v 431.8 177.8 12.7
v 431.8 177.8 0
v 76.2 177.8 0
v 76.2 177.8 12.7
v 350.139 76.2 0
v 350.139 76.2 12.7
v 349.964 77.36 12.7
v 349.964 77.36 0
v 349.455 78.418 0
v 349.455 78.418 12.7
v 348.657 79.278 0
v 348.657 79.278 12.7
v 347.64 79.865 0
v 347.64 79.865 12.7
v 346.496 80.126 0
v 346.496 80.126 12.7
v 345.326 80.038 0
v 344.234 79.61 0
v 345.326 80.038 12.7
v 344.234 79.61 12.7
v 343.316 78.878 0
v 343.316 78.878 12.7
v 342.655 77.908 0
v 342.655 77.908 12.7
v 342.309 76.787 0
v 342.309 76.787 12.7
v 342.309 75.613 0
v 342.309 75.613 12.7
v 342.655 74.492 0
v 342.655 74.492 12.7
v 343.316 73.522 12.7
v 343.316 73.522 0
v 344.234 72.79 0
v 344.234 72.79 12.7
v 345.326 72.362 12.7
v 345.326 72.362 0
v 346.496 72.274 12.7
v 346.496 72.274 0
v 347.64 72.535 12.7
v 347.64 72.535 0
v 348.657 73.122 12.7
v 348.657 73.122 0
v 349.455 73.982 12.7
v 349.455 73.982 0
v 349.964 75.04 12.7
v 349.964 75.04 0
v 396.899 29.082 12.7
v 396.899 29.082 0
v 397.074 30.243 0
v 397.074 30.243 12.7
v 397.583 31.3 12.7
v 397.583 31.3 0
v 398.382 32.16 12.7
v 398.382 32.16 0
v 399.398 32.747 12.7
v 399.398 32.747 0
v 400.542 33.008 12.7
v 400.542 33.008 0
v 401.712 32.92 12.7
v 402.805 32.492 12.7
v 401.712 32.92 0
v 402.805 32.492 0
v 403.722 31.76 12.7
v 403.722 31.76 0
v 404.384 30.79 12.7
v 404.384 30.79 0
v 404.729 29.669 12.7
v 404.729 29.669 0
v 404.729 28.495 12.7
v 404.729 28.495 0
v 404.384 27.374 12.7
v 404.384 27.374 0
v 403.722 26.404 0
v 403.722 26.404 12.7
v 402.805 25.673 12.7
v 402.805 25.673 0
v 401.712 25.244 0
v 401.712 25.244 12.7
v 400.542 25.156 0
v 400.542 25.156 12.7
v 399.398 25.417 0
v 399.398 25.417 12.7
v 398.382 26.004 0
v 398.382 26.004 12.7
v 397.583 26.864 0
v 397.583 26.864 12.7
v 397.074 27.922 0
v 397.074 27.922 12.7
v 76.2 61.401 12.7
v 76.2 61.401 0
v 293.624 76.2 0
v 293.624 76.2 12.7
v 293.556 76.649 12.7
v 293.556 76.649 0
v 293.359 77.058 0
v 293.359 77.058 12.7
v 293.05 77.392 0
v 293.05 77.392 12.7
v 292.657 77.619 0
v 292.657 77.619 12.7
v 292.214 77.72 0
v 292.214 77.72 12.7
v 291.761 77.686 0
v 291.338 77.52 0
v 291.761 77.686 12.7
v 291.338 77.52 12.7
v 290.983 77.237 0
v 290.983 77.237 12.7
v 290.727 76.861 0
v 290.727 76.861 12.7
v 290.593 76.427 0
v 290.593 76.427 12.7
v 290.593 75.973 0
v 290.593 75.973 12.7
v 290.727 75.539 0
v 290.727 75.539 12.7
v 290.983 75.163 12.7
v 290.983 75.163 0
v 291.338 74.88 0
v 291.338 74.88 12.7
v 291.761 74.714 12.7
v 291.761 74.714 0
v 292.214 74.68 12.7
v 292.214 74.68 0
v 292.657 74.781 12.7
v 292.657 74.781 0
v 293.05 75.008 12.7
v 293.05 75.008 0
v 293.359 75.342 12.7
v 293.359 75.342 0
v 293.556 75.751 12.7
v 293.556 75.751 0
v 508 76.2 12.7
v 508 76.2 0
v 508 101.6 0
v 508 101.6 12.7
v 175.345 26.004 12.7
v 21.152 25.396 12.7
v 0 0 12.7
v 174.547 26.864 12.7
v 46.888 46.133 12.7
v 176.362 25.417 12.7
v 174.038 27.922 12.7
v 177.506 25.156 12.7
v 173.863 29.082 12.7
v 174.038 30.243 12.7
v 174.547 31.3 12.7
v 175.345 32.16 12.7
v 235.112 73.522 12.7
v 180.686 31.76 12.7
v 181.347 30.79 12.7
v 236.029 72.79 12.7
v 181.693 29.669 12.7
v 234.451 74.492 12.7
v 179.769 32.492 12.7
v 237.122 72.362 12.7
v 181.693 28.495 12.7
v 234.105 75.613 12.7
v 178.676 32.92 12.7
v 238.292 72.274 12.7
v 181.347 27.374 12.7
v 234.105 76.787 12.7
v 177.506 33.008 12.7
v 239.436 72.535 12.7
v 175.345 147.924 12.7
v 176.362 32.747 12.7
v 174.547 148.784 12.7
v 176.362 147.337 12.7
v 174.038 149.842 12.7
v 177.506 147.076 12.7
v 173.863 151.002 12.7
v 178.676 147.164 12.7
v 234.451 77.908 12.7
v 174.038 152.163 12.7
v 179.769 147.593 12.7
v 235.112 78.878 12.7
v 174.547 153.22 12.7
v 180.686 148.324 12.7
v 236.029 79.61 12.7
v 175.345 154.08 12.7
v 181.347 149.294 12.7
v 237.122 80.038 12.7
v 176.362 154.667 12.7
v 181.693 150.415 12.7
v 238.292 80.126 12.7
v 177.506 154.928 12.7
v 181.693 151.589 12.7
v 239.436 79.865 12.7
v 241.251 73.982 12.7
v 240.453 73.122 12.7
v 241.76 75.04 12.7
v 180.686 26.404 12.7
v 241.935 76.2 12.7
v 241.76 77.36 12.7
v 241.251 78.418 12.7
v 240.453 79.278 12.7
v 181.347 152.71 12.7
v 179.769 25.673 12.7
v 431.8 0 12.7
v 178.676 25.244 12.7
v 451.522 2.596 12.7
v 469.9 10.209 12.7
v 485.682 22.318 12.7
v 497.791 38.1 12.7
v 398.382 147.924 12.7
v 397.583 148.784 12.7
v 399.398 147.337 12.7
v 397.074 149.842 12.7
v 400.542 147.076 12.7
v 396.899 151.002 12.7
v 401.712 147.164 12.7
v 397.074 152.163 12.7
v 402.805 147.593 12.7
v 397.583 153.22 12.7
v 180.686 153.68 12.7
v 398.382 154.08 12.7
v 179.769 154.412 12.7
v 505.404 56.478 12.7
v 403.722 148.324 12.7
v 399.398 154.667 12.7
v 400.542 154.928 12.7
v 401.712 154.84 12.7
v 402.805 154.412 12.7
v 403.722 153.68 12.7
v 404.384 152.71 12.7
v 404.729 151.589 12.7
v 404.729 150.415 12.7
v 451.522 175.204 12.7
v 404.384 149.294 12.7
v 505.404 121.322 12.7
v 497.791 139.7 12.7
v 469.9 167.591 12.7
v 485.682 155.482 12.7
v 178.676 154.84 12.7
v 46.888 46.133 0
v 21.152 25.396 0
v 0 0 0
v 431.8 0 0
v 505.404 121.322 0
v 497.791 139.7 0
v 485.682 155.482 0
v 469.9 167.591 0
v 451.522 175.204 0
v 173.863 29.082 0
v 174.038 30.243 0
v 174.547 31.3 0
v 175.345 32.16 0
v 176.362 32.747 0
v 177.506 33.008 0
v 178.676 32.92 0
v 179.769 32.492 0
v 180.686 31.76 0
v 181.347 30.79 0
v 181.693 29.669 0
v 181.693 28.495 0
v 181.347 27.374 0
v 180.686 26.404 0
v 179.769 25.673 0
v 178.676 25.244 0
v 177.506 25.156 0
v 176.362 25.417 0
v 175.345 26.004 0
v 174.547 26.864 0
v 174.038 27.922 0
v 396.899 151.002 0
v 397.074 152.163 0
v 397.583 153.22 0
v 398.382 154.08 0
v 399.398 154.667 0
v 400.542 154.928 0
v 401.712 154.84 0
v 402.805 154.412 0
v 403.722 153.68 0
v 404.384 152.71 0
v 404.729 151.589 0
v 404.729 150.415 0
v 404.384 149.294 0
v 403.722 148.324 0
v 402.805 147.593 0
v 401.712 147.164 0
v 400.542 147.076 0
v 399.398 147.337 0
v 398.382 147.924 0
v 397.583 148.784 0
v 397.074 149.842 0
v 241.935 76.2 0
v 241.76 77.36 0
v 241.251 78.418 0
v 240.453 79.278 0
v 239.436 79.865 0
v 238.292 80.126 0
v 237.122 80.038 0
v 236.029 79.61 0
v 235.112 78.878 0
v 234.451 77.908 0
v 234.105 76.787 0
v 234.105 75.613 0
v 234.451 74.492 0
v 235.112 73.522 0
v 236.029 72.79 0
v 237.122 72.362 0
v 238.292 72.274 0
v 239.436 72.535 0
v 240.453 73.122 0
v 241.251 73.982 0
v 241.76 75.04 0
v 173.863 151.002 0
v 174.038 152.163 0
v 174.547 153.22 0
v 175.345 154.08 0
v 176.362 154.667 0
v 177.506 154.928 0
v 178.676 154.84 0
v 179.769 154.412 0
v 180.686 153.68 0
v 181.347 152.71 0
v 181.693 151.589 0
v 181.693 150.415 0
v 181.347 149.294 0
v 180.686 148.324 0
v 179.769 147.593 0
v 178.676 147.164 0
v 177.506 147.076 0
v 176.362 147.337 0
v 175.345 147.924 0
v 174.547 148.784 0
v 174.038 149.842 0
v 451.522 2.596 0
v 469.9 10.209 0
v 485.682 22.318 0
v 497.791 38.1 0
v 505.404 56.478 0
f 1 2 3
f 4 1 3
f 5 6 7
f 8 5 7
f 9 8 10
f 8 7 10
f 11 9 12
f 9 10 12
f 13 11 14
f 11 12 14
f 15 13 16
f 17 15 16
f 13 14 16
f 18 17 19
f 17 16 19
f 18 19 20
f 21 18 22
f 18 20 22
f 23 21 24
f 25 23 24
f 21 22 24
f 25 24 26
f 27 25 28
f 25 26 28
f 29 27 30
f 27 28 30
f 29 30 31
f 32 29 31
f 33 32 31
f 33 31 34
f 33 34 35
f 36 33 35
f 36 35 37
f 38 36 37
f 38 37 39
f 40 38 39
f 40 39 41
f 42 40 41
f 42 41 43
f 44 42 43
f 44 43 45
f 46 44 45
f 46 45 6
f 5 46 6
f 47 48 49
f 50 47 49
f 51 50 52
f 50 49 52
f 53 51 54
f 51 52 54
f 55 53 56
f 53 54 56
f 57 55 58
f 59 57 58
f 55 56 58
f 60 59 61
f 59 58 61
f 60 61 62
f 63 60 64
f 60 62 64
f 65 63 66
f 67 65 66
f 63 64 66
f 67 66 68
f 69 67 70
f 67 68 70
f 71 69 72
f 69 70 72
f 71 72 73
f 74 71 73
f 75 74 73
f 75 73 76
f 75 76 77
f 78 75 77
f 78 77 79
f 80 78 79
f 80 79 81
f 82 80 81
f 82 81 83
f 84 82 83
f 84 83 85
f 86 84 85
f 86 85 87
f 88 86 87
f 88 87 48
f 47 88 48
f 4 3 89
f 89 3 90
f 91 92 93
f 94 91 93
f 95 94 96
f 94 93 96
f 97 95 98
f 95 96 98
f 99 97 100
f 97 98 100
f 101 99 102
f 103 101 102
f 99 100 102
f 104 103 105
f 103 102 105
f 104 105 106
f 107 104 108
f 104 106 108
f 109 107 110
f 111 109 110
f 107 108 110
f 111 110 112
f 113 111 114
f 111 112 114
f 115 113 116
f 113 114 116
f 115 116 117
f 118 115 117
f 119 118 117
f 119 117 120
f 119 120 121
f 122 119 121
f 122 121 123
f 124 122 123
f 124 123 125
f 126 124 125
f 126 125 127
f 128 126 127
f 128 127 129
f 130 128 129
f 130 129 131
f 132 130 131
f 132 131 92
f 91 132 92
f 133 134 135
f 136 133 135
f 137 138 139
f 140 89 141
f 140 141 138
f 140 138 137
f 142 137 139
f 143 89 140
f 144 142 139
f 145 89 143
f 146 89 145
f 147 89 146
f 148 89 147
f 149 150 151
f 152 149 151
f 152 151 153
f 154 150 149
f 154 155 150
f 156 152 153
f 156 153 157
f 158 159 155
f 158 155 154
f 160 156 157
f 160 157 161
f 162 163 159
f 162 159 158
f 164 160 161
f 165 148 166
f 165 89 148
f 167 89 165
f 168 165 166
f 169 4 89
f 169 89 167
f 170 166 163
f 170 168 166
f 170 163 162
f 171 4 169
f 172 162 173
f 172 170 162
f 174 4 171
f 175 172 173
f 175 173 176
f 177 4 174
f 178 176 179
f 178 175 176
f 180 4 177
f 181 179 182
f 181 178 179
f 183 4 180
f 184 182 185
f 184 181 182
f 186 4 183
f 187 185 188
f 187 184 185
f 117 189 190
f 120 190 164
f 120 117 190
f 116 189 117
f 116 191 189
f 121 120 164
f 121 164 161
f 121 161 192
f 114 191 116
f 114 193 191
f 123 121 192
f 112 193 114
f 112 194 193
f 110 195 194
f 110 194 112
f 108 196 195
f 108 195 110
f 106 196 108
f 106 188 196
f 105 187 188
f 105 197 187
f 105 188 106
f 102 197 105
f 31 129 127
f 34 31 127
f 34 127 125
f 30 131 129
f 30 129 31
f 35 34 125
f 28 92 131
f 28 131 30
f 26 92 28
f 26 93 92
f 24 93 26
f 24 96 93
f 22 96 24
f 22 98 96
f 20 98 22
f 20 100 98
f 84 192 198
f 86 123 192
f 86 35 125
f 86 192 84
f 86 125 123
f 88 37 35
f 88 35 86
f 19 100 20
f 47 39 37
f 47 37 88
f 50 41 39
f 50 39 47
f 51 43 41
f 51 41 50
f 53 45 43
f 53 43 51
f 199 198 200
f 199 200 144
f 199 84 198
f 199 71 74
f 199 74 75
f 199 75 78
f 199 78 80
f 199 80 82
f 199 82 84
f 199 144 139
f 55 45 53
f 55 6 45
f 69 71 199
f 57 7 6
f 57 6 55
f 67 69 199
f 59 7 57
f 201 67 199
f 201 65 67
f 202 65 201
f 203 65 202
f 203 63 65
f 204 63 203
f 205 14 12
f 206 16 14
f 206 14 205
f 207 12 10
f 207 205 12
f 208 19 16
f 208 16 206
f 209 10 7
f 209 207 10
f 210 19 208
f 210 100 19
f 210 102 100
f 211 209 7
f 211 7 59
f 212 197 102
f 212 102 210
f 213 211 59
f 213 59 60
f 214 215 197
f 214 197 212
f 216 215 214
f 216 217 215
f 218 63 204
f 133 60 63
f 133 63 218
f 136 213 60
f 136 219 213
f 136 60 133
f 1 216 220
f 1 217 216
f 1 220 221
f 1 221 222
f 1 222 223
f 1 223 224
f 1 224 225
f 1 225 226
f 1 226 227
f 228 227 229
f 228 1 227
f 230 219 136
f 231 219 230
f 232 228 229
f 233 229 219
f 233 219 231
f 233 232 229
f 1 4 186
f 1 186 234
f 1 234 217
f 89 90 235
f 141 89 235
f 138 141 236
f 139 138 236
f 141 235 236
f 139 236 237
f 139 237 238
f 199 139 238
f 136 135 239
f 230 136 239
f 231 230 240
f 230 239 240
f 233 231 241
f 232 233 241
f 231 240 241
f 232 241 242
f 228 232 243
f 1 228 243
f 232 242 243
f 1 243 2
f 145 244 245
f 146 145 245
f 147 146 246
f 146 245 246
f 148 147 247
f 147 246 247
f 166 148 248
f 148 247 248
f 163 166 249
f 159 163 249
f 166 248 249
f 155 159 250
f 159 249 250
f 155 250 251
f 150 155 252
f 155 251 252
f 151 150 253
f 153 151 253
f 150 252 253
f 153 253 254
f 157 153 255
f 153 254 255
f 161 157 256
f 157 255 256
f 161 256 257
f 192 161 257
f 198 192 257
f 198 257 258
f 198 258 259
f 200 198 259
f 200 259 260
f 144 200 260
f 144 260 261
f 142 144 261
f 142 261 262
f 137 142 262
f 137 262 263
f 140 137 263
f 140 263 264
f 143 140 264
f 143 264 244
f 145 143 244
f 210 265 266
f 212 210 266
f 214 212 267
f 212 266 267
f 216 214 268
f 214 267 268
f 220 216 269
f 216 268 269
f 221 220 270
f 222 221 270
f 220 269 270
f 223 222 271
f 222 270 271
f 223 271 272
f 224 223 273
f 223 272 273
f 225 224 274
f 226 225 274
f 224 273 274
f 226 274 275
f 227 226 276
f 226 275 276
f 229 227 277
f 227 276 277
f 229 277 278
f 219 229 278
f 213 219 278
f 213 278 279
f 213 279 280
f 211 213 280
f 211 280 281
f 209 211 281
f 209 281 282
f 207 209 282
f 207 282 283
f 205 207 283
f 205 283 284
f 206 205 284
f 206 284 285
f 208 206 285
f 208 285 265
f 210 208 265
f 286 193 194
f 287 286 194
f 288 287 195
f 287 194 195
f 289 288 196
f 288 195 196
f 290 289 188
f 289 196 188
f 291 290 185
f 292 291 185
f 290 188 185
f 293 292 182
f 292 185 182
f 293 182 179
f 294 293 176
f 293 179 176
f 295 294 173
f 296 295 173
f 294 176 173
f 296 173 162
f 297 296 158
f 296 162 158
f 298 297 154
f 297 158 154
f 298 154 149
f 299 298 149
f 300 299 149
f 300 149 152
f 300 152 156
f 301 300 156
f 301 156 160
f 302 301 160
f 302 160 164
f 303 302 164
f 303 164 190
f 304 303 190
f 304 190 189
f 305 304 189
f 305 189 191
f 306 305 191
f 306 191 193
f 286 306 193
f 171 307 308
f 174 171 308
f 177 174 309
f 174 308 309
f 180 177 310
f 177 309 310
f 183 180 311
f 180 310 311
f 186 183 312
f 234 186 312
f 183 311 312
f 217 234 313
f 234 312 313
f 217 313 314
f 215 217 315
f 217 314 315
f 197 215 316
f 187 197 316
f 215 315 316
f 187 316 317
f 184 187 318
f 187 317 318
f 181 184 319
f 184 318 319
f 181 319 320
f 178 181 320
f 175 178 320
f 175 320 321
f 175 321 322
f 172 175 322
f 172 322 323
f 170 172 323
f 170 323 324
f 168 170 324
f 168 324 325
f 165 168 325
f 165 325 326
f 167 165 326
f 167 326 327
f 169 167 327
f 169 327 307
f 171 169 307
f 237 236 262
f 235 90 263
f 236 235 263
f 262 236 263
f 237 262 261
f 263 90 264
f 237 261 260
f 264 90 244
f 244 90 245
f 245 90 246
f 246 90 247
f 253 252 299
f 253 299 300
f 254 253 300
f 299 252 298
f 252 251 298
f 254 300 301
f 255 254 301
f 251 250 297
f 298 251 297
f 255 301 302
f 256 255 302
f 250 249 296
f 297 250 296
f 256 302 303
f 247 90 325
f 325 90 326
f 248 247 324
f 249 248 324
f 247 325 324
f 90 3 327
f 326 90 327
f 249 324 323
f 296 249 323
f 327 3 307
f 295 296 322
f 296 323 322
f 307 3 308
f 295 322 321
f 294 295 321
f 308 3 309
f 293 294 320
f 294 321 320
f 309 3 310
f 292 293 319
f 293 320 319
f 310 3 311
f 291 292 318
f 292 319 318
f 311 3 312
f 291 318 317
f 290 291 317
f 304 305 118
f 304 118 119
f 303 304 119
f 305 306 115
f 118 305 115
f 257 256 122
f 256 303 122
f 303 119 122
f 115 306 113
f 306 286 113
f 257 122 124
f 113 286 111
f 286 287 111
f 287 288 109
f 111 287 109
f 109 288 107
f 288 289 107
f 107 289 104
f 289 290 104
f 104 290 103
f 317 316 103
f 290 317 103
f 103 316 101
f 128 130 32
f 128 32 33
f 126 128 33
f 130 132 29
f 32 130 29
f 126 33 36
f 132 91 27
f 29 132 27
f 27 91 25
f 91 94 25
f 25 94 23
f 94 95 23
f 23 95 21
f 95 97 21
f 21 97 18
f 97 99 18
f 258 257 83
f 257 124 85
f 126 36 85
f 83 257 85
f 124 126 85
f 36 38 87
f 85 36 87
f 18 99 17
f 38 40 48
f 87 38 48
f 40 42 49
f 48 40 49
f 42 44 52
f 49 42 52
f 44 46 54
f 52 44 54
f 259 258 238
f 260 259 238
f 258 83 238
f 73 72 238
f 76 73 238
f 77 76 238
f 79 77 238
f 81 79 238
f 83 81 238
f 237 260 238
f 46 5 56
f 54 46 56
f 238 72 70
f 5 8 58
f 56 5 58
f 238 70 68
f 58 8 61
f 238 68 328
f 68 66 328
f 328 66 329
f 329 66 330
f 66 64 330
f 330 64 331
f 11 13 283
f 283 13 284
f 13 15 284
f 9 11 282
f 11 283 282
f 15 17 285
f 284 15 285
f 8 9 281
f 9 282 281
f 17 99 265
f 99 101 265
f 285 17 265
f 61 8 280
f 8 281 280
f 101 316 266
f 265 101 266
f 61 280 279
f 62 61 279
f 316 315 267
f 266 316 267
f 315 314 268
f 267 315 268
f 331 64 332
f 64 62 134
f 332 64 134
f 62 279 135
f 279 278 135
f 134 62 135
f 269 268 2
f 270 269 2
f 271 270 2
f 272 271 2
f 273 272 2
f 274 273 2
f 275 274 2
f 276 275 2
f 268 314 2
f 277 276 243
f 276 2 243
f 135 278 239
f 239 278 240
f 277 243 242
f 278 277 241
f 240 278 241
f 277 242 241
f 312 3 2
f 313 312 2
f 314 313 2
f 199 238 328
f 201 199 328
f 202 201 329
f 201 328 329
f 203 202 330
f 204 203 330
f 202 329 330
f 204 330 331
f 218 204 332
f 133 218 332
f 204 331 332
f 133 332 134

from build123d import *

# Parameters (mm, degrees)
BOSS_EXTRUDE1_DEPTH = 12.7
SKETCH3_R           = 3.937
CUT_EXTRUDE1_DEPTH  = 539.366167213
SKETCH4_R           = 1.524
SKETCH4_R_2         = 3.937
CUT_EXTRUDE2_DEPTH  = 539.366167213


with BuildPart() as part:
    # Sketch2 → Boss-Extrude1 (new body)
    with BuildSketch(Plane.XY):
        with BuildLine():
            Line((0, 0), (431.8, 0))
            ThreePointArc((431.8, 0), (485.681536726, 22.318463274), (508, 76.2))
            Line((508, 76.2), (508, 101.6))
            ThreePointArc((508, 101.6), (485.681536726, 155.481536726), (431.8, 177.8))
            Line((431.8, 177.8), (152.4, 177.8))
            Line((152.4, 177.8), (76.2, 177.8))
            Line((76.2, 177.8), (76.2, 61.401251199))
            ThreePointArc((76.2, 61.401251199), (33.506060073, 36.401783403), (0, 0))
        make_face()
    extrude(amount=BOSS_EXTRUDE1_DEPTH)

    # Sketch3 → Cut-Extrude1 (cut, through all)
    with BuildSketch(Plane(origin=(0, 0, 0), x_dir=(-1, 0, 0), z_dir=(0, 0, -1))):
        with Locations((-177.8, 29.082055279)):
            Circle(SKETCH3_R)
        with Locations((-400.836394982, 29.082055279)):
            Circle(SKETCH3_R)
        with Locations((-400.836394982, 151.002055279)):
            Circle(SKETCH3_R)
        with Locations((-177.8, 151.002055279)):
            Circle(SKETCH3_R)
    extrude(amount=-CUT_EXTRUDE1_DEPTH, mode=Mode.SUBTRACT)

    # Sketch4 → Cut-Extrude2 (cut, through all)
    with BuildSketch(Plane.XY.offset(12.7)):
        with Locations((292.1, 76.2)):
            Circle(SKETCH4_R)
        with Locations((237.998, 76.2)):
            Circle(SKETCH4_R_2)
        with Locations((346.202, 76.2)):
            Circle(SKETCH4_R_2)
    extrude(amount=-CUT_EXTRUDE2_DEPTH, mode=Mode.SUBTRACT)


solid = part.part
